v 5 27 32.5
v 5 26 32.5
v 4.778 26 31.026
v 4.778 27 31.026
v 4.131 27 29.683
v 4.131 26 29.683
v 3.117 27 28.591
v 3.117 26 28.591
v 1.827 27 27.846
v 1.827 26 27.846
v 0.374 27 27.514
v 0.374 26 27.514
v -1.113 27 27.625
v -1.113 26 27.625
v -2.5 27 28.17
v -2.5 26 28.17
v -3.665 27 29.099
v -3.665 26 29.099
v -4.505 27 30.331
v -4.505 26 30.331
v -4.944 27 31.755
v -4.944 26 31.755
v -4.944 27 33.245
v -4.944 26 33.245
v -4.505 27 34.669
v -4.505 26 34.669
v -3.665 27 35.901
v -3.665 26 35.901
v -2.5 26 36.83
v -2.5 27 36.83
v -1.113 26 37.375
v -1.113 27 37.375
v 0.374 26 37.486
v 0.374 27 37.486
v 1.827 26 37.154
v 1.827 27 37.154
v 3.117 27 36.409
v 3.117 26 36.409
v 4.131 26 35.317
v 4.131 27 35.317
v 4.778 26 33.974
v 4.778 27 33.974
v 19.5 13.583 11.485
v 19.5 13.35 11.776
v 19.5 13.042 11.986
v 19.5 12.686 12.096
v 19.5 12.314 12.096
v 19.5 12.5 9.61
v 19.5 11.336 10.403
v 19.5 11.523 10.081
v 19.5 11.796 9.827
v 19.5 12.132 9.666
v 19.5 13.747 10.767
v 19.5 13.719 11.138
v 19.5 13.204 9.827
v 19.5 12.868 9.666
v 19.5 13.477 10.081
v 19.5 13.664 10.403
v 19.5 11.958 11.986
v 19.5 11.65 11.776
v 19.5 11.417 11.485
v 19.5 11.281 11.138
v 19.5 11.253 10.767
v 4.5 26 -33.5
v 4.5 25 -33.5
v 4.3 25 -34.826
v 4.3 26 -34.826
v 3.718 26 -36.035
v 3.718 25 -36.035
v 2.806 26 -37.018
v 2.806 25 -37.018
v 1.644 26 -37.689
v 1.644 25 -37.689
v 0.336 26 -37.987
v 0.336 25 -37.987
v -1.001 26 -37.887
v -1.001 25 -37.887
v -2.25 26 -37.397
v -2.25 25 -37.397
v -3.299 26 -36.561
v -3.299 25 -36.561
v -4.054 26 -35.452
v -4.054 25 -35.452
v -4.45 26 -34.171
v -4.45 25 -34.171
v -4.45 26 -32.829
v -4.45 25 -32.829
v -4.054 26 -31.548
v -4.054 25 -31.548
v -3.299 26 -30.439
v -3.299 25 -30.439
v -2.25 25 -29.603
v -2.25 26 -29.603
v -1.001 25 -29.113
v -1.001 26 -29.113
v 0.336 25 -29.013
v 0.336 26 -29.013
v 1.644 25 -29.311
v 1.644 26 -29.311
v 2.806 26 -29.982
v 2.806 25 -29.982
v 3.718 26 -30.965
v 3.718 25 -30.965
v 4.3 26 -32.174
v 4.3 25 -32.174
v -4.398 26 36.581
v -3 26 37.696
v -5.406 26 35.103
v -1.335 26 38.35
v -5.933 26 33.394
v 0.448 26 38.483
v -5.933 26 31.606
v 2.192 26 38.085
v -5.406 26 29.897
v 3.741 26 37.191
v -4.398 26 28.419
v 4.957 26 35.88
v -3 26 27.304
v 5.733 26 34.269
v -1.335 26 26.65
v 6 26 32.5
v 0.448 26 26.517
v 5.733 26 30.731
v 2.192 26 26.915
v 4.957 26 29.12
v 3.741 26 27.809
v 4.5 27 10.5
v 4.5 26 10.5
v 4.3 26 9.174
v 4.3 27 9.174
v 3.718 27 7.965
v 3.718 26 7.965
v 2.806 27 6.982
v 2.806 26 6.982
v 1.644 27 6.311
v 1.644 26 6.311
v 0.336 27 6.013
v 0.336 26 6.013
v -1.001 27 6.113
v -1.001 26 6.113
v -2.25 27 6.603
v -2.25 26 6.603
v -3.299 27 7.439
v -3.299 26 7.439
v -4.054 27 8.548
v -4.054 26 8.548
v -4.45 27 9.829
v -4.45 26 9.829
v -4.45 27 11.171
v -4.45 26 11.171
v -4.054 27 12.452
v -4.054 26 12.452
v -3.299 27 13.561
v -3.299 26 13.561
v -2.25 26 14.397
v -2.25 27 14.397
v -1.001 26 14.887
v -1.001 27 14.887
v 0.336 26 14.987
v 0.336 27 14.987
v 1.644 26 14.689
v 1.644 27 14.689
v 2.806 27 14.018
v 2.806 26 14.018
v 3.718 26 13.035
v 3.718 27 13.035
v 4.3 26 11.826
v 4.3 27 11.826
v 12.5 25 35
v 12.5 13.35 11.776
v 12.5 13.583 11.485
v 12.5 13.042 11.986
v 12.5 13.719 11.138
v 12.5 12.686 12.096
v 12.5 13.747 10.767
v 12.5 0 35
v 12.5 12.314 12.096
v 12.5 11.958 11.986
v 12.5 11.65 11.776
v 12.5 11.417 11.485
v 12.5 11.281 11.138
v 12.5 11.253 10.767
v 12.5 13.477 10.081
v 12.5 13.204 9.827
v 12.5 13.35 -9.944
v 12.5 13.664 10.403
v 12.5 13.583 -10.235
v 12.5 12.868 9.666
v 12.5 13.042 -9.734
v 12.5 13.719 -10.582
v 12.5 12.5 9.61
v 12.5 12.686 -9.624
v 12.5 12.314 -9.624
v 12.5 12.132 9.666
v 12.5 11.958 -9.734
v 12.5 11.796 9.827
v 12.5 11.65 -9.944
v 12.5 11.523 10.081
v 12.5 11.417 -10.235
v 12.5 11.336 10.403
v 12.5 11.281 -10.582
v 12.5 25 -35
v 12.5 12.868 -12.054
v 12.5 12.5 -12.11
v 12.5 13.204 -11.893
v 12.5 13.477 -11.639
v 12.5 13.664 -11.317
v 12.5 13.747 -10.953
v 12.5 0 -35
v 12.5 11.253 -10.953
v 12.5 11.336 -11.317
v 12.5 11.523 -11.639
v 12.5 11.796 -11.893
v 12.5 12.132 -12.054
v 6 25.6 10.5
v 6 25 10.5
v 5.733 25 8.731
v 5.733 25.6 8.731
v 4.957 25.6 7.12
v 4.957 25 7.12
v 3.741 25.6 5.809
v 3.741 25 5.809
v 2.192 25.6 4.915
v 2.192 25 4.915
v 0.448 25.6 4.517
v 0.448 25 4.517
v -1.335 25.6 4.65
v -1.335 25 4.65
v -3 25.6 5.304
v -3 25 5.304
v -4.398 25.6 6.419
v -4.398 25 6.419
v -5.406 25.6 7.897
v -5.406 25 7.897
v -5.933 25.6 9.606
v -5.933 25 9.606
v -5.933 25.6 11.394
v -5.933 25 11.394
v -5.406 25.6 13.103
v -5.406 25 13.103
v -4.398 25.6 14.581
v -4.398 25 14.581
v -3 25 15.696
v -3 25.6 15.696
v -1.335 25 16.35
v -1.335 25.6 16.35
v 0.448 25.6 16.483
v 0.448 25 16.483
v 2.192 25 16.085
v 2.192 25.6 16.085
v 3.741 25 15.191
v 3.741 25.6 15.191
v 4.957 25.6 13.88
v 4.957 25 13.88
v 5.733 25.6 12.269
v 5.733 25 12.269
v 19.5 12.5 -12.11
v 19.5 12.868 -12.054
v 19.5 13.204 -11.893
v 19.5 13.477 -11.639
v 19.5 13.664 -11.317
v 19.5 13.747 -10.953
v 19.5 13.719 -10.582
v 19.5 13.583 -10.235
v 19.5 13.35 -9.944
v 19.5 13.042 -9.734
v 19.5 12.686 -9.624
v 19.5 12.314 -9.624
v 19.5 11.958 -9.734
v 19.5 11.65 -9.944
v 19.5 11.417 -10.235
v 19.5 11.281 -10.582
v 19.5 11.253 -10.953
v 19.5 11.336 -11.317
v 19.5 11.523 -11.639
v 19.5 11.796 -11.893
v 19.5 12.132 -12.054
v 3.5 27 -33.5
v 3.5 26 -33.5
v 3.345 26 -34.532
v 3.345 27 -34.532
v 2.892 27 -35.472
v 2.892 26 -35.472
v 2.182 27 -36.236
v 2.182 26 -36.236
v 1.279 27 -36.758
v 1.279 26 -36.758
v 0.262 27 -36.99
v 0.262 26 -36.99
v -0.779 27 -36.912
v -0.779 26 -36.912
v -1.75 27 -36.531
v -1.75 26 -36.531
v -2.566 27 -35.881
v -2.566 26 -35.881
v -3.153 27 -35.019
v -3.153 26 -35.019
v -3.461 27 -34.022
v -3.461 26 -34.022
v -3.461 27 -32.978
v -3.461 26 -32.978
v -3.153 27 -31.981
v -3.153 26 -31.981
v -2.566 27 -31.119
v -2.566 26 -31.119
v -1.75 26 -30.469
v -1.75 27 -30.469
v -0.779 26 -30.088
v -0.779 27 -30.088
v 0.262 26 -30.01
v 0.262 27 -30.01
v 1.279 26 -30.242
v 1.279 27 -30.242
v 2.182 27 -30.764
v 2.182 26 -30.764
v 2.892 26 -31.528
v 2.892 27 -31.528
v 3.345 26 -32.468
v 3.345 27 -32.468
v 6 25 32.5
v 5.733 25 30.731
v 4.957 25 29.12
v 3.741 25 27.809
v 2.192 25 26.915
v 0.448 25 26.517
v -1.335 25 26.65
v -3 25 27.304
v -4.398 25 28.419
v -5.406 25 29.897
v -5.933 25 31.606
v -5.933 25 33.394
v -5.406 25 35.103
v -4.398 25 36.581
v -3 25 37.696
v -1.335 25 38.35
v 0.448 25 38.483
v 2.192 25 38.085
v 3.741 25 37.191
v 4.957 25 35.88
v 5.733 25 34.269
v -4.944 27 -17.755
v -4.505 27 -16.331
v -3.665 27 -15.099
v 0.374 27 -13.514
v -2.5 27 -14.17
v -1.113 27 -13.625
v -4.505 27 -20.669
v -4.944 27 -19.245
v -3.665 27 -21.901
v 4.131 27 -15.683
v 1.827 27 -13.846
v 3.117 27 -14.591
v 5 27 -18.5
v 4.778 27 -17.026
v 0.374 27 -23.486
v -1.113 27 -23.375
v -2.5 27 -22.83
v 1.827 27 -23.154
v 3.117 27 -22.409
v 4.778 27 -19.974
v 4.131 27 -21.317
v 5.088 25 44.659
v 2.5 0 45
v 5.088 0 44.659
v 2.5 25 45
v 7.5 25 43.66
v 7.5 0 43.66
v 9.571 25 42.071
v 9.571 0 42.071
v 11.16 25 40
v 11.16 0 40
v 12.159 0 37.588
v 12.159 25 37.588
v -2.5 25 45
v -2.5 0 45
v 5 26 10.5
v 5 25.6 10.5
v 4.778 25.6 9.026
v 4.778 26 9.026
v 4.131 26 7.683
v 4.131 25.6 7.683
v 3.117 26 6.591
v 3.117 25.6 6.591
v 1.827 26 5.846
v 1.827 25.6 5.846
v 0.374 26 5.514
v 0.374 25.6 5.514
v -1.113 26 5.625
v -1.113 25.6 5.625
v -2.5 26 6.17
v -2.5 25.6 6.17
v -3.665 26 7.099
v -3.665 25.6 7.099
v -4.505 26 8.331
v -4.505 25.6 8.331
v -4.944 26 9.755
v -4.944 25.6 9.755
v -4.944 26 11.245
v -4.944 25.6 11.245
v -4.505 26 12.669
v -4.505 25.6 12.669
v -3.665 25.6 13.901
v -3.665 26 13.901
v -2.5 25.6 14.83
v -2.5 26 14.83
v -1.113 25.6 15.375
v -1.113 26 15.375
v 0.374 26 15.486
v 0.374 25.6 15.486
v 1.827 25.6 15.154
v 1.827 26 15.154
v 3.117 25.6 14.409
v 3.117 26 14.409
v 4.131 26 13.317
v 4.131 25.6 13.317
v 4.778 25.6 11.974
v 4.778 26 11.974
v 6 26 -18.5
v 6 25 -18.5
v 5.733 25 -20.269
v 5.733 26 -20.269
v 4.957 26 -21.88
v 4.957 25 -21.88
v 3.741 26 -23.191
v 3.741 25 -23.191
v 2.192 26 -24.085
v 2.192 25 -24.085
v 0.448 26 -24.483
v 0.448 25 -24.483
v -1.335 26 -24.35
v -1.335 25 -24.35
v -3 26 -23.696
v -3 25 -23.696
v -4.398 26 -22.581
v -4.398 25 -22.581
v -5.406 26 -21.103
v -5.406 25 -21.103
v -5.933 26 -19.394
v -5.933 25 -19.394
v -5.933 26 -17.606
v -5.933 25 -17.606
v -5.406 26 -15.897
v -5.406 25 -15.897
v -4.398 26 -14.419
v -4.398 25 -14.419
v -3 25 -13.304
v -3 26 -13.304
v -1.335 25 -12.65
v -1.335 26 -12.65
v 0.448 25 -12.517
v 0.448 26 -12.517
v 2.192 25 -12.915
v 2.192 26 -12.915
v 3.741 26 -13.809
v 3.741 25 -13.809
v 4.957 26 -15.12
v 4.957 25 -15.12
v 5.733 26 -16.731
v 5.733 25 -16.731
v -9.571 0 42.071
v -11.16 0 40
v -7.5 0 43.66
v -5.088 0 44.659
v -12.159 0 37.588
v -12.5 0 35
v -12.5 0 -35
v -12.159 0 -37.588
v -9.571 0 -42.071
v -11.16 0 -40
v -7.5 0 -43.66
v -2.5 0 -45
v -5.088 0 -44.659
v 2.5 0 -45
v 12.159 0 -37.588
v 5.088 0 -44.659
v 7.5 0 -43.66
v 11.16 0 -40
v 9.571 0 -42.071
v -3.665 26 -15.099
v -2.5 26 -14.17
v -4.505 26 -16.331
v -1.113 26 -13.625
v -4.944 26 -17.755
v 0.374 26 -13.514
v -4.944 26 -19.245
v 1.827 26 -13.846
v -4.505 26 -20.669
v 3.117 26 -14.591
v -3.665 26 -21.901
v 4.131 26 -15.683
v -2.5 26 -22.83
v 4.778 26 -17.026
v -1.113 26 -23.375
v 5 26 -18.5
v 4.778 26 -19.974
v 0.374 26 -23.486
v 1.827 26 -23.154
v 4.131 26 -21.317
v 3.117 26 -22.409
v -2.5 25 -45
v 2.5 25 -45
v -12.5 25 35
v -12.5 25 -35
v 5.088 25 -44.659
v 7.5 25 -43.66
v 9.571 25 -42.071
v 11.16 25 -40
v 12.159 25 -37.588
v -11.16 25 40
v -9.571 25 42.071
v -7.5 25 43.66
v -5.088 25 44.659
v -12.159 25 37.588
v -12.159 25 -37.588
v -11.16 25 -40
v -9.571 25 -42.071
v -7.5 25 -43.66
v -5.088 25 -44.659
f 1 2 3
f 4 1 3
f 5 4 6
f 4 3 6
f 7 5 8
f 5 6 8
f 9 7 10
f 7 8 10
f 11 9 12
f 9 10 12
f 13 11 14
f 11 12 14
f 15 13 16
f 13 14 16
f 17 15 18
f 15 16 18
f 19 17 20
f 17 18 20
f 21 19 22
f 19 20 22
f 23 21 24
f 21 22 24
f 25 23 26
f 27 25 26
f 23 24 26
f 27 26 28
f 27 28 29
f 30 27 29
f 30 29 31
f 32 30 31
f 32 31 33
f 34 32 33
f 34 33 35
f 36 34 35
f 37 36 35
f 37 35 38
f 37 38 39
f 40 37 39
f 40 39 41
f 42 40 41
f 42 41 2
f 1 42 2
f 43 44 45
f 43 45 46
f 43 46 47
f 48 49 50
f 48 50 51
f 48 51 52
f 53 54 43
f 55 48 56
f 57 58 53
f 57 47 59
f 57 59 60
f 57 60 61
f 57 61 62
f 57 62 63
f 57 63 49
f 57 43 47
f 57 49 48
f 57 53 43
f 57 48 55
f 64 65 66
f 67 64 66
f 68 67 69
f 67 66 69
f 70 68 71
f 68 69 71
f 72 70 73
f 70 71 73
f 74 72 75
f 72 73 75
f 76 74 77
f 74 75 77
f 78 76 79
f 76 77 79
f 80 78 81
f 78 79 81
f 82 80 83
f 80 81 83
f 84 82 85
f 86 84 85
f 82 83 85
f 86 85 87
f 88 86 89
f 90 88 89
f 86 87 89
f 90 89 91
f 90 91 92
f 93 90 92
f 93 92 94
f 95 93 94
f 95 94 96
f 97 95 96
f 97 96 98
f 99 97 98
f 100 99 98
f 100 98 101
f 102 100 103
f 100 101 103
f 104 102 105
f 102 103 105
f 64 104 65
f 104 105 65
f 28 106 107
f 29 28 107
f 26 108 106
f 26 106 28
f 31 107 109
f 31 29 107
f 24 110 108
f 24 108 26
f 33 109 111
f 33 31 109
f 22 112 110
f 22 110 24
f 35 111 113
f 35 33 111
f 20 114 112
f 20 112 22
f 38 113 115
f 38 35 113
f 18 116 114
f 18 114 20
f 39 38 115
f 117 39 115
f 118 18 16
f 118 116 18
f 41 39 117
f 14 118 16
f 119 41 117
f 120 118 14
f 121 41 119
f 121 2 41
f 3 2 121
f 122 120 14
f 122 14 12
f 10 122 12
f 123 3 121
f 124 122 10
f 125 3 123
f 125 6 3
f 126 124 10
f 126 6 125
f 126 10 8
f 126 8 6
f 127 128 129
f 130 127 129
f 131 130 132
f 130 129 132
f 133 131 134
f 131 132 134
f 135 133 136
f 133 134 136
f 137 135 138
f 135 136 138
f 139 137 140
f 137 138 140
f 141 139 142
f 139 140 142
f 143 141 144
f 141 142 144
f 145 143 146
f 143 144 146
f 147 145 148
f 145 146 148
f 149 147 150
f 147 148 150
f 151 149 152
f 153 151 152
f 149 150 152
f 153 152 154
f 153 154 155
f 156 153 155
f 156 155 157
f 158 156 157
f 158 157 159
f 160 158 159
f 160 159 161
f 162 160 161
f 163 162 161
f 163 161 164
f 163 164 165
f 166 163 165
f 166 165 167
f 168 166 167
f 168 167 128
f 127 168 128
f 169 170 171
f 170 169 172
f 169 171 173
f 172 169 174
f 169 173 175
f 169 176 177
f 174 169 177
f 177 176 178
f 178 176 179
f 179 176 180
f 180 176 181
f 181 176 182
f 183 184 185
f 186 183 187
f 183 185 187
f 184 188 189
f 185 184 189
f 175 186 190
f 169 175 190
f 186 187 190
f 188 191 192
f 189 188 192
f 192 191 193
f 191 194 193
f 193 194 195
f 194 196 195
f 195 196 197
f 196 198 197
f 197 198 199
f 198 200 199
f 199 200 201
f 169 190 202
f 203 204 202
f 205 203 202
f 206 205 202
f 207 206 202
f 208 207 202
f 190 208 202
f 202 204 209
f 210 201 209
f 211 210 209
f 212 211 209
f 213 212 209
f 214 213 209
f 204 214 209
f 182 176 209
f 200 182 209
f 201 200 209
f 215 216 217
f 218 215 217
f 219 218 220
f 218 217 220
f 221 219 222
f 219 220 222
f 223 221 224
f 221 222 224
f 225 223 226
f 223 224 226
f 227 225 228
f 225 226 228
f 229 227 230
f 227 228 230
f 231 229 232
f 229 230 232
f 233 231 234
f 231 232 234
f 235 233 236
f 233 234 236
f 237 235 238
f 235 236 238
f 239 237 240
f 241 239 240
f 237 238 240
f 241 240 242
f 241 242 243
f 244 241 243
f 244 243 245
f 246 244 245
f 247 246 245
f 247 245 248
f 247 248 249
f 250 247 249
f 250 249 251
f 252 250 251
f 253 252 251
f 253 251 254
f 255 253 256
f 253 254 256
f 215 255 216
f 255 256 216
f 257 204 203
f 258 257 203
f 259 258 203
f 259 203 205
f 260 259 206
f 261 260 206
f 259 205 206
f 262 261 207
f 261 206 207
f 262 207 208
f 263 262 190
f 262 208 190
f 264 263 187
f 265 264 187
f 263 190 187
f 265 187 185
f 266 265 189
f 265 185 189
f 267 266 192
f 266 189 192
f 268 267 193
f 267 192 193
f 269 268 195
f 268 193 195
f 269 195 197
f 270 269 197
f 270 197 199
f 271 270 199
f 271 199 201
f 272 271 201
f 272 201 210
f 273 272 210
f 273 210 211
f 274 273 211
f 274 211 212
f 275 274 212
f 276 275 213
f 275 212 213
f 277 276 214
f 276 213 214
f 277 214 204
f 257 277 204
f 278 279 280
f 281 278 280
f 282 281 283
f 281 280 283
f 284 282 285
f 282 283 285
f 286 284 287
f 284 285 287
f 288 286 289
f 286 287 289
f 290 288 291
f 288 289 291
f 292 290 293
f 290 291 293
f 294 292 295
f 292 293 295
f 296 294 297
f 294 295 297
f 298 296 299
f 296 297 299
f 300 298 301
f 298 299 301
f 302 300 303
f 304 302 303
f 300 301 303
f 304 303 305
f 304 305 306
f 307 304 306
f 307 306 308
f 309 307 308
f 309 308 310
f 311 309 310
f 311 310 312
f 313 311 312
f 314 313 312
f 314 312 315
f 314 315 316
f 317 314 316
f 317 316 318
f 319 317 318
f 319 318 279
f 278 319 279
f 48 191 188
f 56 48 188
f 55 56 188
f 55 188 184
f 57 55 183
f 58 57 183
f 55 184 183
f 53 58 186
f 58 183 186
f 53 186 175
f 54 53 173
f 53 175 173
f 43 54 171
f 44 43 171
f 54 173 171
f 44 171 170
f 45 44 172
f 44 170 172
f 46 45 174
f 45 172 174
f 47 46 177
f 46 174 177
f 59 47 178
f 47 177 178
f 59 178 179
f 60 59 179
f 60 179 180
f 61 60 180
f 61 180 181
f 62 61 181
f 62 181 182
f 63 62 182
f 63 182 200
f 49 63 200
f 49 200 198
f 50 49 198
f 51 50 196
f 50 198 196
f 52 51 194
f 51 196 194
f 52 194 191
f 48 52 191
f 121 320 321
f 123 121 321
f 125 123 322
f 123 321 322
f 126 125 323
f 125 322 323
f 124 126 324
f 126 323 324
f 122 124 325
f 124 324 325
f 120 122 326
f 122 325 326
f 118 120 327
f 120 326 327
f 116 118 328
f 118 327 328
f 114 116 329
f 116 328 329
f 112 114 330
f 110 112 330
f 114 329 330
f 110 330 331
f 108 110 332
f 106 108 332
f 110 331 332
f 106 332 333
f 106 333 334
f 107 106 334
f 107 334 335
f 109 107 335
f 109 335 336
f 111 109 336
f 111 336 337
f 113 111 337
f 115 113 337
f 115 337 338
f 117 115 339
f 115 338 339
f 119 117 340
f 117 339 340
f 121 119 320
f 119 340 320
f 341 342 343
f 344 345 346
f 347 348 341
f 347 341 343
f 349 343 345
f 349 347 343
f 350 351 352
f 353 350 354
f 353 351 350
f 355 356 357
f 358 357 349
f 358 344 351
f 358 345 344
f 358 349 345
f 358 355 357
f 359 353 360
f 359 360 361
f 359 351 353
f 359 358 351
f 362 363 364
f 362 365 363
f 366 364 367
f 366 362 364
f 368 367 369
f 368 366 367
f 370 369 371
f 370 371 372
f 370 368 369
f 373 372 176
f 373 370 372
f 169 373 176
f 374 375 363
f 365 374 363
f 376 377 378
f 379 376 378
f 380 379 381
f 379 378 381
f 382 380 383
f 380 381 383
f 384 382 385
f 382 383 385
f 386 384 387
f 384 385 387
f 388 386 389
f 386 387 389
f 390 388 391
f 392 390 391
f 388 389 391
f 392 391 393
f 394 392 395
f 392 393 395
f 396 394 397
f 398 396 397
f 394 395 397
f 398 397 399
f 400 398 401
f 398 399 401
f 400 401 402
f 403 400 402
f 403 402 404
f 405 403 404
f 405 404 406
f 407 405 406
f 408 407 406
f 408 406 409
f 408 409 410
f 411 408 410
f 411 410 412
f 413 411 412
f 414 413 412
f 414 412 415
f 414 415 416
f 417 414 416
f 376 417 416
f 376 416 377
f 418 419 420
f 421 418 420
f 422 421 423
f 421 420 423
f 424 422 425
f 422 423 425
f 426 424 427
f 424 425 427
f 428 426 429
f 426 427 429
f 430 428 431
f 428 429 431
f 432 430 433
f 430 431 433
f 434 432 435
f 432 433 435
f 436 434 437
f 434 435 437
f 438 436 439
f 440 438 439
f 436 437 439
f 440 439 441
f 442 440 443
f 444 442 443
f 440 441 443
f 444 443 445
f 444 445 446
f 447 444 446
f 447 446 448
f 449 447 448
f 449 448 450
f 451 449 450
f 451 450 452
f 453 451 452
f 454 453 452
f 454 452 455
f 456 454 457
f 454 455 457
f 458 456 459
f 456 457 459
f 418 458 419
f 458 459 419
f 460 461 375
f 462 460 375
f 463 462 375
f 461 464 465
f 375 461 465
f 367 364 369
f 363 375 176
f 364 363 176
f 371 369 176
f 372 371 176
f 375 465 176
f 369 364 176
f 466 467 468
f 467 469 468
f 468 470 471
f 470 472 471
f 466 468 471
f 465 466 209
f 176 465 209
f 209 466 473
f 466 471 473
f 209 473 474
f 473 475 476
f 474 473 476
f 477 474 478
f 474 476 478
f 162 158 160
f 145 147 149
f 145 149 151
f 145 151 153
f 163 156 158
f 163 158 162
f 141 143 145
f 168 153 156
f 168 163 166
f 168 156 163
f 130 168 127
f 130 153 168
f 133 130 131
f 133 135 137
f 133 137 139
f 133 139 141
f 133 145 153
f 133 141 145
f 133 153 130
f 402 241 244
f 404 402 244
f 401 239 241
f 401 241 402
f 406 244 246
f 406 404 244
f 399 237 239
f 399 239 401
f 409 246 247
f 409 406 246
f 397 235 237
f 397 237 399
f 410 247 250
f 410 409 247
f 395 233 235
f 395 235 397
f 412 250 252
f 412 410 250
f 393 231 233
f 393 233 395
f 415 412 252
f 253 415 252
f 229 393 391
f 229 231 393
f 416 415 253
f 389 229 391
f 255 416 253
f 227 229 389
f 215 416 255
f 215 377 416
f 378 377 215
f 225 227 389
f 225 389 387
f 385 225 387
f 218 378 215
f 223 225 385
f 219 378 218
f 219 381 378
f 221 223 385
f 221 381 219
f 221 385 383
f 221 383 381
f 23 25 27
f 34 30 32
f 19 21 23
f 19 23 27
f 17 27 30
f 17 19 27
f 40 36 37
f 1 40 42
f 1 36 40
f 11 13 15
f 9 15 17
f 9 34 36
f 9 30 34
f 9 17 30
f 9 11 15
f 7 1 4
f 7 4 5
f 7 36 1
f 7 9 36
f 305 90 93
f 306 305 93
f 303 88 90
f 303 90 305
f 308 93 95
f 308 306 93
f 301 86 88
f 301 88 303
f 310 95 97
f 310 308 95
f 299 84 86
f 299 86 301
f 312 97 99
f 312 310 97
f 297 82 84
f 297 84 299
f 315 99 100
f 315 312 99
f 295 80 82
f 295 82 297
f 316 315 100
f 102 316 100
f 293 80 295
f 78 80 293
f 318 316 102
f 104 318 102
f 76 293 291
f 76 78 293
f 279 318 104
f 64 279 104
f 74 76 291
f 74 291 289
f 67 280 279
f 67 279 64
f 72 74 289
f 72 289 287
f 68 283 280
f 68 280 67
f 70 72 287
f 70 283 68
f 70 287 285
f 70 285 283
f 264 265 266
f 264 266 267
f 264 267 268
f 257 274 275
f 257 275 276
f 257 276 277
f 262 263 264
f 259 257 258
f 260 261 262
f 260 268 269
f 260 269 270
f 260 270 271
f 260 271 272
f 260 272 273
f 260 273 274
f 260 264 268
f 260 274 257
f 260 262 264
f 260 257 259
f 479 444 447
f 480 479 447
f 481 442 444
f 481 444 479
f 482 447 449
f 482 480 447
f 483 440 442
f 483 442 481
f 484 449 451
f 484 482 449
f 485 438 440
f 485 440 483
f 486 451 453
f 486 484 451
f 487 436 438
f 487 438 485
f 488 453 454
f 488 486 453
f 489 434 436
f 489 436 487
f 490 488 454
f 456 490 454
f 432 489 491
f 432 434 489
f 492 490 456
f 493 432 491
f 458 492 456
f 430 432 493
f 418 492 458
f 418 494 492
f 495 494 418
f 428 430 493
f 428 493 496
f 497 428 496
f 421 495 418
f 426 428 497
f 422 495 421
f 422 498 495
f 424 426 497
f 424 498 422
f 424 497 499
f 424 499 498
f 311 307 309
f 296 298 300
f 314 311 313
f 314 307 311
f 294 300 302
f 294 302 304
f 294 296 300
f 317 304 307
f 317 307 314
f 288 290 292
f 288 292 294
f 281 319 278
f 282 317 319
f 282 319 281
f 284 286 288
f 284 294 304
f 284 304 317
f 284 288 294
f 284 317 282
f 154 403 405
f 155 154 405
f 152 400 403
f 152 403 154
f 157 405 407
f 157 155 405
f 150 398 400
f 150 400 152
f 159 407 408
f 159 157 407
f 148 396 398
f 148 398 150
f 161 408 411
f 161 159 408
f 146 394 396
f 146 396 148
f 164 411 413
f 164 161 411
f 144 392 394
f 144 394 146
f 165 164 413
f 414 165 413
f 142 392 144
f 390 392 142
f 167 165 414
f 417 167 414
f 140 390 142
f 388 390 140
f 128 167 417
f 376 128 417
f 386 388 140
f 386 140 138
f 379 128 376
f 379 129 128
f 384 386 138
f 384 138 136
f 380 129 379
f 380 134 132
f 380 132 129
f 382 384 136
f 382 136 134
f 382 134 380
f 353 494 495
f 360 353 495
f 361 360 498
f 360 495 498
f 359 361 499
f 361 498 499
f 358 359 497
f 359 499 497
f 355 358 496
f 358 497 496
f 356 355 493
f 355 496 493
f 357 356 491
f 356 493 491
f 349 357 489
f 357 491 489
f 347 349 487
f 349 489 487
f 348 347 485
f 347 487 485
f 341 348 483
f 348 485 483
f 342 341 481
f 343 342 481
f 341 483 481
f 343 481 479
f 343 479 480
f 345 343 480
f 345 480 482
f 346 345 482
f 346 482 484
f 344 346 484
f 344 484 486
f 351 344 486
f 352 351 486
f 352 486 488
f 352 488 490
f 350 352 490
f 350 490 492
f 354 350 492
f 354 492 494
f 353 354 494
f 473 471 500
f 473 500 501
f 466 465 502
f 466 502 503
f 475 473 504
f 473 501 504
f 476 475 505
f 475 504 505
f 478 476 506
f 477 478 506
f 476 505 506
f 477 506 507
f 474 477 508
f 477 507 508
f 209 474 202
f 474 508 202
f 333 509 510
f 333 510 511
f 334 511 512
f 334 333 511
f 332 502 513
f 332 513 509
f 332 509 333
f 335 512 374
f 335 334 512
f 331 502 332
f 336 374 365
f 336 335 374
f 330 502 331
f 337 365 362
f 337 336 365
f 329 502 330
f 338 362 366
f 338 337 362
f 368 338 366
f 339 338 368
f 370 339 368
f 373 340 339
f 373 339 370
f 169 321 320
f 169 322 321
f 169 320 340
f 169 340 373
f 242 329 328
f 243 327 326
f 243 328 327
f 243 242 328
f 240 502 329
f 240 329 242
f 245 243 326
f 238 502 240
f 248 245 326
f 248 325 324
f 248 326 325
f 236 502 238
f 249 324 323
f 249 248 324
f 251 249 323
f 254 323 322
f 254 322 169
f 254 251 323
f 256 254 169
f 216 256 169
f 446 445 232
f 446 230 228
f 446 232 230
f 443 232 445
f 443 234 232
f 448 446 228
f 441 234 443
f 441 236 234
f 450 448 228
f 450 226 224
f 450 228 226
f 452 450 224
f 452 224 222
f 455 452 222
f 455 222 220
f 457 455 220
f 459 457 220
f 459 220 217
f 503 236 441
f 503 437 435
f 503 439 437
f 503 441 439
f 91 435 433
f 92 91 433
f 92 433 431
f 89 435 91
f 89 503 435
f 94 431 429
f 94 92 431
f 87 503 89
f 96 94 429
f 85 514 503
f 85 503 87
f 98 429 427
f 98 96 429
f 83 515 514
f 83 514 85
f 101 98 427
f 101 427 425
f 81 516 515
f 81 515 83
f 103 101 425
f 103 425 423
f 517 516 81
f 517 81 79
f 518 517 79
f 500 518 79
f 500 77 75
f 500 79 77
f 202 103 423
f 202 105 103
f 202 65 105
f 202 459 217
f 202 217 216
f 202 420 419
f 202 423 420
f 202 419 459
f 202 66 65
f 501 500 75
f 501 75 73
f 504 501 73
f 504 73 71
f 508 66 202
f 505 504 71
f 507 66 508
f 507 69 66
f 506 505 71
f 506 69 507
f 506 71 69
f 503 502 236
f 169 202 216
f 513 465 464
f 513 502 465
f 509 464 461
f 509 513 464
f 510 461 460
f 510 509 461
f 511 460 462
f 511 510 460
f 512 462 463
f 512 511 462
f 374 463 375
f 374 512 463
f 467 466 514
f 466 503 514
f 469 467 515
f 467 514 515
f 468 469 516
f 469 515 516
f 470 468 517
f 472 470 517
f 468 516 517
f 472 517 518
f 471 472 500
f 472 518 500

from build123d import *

# Parameters (mm, degrees)
SKETCH1_W           = 25
SKETCH1_H           = 90
BOSS_EXTRUDE1_DEPTH = 25
SKETCH2_R           = 5
SKETCH2_R_2         = 3.5
SKETCH2_R_3         = 4.5
BOSS_EXTRUDE2_DEPTH = 2
SKETCH2_3_R         = 6
SKETCH2_3_R_2       = 4.5
SKETCH2_3_R_3       = 5
BOSS_EXTRUDE3_DEPTH = 1
SKETCH2_4_R         = 6
BOSS_EXTRUDE4_DEPTH = 0.6
FILLET1_R           = 10
SKETCH3_R           = 1.25
BOSS_EXTRUDE5_DEPTH = 7


with BuildPart() as part:
    # Sketch1 → Boss-Extrude1 (new body)
    with BuildSketch(Plane(origin=(0, 0, 0), x_dir=(1, 0, 0), z_dir=(0, 1, 0))):
        Rectangle(SKETCH1_W, SKETCH1_H)
    extrude(amount=BOSS_EXTRUDE1_DEPTH)

    # Sketch2 → Boss-Extrude2 (add)
    with BuildSketch(Plane(origin=(0, 25, 0), x_dir=(1, 0, 0), z_dir=(0, 1, 0))):
        with Locations((0, -32.5)):
            Circle(SKETCH2_R)
        with Locations((0, 18.5)):
            Circle(SKETCH2_R)
        with Locations((0, 33.5)):
            Circle(SKETCH2_R_2)
        with Locations((0, -10.5)):
            Circle(SKETCH2_R_3)
    extrude(amount=BOSS_EXTRUDE2_DEPTH)

    # Sketch2<3> → Boss-Extrude3 (add)
    with BuildSketch(Plane(origin=(0, 25, 0), x_dir=(1, 0, 0), z_dir=(0, 1, 0))):
        with Locations((0, -32.5)):
            Circle(SKETCH2_3_R)
        with Locations((0, 18.5)):
            Circle(SKETCH2_3_R)
        with Locations((0, 33.5)):
            Circle(SKETCH2_3_R_2)
        with Locations((0, -10.5)):
            Circle(SKETCH2_3_R_3)
    extrude(amount=BOSS_EXTRUDE3_DEPTH)

    # Sketch2<4> → Boss-Extrude4 (add)
    with BuildSketch(Plane(origin=(0, 25, 0), x_dir=(1, 0, 0), z_dir=(0, 1, 0))):
        with Locations((0, -10.5)):
            Circle(SKETCH2_4_R)
    extrude(amount=BOSS_EXTRUDE4_DEPTH)

    # Fillet1
    fillet1_edges = [part.edges().sort_by_distance(p)[0] for p in [
        (12.5, 12.5, 45),
        (-12.5, 12.5, 45),
        (-12.5, 12.5, -45),
        (12.5, 12.5, -45),
    ]]
    fillet(fillet1_edges, radius=FILLET1_R)

    # Sketch3 → Boss-Extrude5 (add)
    with BuildSketch(Plane(origin=(12.5, 0, 0), x_dir=(0, 0, -1), z_dir=(1, 0, 0))):
        with Locations((-10.86, 12.5)):
            Circle(SKETCH3_R)
        with Locations((10.86, 12.5)):
            Circle(SKETCH3_R)
    extrude(amount=BOSS_EXTRUDE5_DEPTH)


solid = part.part
